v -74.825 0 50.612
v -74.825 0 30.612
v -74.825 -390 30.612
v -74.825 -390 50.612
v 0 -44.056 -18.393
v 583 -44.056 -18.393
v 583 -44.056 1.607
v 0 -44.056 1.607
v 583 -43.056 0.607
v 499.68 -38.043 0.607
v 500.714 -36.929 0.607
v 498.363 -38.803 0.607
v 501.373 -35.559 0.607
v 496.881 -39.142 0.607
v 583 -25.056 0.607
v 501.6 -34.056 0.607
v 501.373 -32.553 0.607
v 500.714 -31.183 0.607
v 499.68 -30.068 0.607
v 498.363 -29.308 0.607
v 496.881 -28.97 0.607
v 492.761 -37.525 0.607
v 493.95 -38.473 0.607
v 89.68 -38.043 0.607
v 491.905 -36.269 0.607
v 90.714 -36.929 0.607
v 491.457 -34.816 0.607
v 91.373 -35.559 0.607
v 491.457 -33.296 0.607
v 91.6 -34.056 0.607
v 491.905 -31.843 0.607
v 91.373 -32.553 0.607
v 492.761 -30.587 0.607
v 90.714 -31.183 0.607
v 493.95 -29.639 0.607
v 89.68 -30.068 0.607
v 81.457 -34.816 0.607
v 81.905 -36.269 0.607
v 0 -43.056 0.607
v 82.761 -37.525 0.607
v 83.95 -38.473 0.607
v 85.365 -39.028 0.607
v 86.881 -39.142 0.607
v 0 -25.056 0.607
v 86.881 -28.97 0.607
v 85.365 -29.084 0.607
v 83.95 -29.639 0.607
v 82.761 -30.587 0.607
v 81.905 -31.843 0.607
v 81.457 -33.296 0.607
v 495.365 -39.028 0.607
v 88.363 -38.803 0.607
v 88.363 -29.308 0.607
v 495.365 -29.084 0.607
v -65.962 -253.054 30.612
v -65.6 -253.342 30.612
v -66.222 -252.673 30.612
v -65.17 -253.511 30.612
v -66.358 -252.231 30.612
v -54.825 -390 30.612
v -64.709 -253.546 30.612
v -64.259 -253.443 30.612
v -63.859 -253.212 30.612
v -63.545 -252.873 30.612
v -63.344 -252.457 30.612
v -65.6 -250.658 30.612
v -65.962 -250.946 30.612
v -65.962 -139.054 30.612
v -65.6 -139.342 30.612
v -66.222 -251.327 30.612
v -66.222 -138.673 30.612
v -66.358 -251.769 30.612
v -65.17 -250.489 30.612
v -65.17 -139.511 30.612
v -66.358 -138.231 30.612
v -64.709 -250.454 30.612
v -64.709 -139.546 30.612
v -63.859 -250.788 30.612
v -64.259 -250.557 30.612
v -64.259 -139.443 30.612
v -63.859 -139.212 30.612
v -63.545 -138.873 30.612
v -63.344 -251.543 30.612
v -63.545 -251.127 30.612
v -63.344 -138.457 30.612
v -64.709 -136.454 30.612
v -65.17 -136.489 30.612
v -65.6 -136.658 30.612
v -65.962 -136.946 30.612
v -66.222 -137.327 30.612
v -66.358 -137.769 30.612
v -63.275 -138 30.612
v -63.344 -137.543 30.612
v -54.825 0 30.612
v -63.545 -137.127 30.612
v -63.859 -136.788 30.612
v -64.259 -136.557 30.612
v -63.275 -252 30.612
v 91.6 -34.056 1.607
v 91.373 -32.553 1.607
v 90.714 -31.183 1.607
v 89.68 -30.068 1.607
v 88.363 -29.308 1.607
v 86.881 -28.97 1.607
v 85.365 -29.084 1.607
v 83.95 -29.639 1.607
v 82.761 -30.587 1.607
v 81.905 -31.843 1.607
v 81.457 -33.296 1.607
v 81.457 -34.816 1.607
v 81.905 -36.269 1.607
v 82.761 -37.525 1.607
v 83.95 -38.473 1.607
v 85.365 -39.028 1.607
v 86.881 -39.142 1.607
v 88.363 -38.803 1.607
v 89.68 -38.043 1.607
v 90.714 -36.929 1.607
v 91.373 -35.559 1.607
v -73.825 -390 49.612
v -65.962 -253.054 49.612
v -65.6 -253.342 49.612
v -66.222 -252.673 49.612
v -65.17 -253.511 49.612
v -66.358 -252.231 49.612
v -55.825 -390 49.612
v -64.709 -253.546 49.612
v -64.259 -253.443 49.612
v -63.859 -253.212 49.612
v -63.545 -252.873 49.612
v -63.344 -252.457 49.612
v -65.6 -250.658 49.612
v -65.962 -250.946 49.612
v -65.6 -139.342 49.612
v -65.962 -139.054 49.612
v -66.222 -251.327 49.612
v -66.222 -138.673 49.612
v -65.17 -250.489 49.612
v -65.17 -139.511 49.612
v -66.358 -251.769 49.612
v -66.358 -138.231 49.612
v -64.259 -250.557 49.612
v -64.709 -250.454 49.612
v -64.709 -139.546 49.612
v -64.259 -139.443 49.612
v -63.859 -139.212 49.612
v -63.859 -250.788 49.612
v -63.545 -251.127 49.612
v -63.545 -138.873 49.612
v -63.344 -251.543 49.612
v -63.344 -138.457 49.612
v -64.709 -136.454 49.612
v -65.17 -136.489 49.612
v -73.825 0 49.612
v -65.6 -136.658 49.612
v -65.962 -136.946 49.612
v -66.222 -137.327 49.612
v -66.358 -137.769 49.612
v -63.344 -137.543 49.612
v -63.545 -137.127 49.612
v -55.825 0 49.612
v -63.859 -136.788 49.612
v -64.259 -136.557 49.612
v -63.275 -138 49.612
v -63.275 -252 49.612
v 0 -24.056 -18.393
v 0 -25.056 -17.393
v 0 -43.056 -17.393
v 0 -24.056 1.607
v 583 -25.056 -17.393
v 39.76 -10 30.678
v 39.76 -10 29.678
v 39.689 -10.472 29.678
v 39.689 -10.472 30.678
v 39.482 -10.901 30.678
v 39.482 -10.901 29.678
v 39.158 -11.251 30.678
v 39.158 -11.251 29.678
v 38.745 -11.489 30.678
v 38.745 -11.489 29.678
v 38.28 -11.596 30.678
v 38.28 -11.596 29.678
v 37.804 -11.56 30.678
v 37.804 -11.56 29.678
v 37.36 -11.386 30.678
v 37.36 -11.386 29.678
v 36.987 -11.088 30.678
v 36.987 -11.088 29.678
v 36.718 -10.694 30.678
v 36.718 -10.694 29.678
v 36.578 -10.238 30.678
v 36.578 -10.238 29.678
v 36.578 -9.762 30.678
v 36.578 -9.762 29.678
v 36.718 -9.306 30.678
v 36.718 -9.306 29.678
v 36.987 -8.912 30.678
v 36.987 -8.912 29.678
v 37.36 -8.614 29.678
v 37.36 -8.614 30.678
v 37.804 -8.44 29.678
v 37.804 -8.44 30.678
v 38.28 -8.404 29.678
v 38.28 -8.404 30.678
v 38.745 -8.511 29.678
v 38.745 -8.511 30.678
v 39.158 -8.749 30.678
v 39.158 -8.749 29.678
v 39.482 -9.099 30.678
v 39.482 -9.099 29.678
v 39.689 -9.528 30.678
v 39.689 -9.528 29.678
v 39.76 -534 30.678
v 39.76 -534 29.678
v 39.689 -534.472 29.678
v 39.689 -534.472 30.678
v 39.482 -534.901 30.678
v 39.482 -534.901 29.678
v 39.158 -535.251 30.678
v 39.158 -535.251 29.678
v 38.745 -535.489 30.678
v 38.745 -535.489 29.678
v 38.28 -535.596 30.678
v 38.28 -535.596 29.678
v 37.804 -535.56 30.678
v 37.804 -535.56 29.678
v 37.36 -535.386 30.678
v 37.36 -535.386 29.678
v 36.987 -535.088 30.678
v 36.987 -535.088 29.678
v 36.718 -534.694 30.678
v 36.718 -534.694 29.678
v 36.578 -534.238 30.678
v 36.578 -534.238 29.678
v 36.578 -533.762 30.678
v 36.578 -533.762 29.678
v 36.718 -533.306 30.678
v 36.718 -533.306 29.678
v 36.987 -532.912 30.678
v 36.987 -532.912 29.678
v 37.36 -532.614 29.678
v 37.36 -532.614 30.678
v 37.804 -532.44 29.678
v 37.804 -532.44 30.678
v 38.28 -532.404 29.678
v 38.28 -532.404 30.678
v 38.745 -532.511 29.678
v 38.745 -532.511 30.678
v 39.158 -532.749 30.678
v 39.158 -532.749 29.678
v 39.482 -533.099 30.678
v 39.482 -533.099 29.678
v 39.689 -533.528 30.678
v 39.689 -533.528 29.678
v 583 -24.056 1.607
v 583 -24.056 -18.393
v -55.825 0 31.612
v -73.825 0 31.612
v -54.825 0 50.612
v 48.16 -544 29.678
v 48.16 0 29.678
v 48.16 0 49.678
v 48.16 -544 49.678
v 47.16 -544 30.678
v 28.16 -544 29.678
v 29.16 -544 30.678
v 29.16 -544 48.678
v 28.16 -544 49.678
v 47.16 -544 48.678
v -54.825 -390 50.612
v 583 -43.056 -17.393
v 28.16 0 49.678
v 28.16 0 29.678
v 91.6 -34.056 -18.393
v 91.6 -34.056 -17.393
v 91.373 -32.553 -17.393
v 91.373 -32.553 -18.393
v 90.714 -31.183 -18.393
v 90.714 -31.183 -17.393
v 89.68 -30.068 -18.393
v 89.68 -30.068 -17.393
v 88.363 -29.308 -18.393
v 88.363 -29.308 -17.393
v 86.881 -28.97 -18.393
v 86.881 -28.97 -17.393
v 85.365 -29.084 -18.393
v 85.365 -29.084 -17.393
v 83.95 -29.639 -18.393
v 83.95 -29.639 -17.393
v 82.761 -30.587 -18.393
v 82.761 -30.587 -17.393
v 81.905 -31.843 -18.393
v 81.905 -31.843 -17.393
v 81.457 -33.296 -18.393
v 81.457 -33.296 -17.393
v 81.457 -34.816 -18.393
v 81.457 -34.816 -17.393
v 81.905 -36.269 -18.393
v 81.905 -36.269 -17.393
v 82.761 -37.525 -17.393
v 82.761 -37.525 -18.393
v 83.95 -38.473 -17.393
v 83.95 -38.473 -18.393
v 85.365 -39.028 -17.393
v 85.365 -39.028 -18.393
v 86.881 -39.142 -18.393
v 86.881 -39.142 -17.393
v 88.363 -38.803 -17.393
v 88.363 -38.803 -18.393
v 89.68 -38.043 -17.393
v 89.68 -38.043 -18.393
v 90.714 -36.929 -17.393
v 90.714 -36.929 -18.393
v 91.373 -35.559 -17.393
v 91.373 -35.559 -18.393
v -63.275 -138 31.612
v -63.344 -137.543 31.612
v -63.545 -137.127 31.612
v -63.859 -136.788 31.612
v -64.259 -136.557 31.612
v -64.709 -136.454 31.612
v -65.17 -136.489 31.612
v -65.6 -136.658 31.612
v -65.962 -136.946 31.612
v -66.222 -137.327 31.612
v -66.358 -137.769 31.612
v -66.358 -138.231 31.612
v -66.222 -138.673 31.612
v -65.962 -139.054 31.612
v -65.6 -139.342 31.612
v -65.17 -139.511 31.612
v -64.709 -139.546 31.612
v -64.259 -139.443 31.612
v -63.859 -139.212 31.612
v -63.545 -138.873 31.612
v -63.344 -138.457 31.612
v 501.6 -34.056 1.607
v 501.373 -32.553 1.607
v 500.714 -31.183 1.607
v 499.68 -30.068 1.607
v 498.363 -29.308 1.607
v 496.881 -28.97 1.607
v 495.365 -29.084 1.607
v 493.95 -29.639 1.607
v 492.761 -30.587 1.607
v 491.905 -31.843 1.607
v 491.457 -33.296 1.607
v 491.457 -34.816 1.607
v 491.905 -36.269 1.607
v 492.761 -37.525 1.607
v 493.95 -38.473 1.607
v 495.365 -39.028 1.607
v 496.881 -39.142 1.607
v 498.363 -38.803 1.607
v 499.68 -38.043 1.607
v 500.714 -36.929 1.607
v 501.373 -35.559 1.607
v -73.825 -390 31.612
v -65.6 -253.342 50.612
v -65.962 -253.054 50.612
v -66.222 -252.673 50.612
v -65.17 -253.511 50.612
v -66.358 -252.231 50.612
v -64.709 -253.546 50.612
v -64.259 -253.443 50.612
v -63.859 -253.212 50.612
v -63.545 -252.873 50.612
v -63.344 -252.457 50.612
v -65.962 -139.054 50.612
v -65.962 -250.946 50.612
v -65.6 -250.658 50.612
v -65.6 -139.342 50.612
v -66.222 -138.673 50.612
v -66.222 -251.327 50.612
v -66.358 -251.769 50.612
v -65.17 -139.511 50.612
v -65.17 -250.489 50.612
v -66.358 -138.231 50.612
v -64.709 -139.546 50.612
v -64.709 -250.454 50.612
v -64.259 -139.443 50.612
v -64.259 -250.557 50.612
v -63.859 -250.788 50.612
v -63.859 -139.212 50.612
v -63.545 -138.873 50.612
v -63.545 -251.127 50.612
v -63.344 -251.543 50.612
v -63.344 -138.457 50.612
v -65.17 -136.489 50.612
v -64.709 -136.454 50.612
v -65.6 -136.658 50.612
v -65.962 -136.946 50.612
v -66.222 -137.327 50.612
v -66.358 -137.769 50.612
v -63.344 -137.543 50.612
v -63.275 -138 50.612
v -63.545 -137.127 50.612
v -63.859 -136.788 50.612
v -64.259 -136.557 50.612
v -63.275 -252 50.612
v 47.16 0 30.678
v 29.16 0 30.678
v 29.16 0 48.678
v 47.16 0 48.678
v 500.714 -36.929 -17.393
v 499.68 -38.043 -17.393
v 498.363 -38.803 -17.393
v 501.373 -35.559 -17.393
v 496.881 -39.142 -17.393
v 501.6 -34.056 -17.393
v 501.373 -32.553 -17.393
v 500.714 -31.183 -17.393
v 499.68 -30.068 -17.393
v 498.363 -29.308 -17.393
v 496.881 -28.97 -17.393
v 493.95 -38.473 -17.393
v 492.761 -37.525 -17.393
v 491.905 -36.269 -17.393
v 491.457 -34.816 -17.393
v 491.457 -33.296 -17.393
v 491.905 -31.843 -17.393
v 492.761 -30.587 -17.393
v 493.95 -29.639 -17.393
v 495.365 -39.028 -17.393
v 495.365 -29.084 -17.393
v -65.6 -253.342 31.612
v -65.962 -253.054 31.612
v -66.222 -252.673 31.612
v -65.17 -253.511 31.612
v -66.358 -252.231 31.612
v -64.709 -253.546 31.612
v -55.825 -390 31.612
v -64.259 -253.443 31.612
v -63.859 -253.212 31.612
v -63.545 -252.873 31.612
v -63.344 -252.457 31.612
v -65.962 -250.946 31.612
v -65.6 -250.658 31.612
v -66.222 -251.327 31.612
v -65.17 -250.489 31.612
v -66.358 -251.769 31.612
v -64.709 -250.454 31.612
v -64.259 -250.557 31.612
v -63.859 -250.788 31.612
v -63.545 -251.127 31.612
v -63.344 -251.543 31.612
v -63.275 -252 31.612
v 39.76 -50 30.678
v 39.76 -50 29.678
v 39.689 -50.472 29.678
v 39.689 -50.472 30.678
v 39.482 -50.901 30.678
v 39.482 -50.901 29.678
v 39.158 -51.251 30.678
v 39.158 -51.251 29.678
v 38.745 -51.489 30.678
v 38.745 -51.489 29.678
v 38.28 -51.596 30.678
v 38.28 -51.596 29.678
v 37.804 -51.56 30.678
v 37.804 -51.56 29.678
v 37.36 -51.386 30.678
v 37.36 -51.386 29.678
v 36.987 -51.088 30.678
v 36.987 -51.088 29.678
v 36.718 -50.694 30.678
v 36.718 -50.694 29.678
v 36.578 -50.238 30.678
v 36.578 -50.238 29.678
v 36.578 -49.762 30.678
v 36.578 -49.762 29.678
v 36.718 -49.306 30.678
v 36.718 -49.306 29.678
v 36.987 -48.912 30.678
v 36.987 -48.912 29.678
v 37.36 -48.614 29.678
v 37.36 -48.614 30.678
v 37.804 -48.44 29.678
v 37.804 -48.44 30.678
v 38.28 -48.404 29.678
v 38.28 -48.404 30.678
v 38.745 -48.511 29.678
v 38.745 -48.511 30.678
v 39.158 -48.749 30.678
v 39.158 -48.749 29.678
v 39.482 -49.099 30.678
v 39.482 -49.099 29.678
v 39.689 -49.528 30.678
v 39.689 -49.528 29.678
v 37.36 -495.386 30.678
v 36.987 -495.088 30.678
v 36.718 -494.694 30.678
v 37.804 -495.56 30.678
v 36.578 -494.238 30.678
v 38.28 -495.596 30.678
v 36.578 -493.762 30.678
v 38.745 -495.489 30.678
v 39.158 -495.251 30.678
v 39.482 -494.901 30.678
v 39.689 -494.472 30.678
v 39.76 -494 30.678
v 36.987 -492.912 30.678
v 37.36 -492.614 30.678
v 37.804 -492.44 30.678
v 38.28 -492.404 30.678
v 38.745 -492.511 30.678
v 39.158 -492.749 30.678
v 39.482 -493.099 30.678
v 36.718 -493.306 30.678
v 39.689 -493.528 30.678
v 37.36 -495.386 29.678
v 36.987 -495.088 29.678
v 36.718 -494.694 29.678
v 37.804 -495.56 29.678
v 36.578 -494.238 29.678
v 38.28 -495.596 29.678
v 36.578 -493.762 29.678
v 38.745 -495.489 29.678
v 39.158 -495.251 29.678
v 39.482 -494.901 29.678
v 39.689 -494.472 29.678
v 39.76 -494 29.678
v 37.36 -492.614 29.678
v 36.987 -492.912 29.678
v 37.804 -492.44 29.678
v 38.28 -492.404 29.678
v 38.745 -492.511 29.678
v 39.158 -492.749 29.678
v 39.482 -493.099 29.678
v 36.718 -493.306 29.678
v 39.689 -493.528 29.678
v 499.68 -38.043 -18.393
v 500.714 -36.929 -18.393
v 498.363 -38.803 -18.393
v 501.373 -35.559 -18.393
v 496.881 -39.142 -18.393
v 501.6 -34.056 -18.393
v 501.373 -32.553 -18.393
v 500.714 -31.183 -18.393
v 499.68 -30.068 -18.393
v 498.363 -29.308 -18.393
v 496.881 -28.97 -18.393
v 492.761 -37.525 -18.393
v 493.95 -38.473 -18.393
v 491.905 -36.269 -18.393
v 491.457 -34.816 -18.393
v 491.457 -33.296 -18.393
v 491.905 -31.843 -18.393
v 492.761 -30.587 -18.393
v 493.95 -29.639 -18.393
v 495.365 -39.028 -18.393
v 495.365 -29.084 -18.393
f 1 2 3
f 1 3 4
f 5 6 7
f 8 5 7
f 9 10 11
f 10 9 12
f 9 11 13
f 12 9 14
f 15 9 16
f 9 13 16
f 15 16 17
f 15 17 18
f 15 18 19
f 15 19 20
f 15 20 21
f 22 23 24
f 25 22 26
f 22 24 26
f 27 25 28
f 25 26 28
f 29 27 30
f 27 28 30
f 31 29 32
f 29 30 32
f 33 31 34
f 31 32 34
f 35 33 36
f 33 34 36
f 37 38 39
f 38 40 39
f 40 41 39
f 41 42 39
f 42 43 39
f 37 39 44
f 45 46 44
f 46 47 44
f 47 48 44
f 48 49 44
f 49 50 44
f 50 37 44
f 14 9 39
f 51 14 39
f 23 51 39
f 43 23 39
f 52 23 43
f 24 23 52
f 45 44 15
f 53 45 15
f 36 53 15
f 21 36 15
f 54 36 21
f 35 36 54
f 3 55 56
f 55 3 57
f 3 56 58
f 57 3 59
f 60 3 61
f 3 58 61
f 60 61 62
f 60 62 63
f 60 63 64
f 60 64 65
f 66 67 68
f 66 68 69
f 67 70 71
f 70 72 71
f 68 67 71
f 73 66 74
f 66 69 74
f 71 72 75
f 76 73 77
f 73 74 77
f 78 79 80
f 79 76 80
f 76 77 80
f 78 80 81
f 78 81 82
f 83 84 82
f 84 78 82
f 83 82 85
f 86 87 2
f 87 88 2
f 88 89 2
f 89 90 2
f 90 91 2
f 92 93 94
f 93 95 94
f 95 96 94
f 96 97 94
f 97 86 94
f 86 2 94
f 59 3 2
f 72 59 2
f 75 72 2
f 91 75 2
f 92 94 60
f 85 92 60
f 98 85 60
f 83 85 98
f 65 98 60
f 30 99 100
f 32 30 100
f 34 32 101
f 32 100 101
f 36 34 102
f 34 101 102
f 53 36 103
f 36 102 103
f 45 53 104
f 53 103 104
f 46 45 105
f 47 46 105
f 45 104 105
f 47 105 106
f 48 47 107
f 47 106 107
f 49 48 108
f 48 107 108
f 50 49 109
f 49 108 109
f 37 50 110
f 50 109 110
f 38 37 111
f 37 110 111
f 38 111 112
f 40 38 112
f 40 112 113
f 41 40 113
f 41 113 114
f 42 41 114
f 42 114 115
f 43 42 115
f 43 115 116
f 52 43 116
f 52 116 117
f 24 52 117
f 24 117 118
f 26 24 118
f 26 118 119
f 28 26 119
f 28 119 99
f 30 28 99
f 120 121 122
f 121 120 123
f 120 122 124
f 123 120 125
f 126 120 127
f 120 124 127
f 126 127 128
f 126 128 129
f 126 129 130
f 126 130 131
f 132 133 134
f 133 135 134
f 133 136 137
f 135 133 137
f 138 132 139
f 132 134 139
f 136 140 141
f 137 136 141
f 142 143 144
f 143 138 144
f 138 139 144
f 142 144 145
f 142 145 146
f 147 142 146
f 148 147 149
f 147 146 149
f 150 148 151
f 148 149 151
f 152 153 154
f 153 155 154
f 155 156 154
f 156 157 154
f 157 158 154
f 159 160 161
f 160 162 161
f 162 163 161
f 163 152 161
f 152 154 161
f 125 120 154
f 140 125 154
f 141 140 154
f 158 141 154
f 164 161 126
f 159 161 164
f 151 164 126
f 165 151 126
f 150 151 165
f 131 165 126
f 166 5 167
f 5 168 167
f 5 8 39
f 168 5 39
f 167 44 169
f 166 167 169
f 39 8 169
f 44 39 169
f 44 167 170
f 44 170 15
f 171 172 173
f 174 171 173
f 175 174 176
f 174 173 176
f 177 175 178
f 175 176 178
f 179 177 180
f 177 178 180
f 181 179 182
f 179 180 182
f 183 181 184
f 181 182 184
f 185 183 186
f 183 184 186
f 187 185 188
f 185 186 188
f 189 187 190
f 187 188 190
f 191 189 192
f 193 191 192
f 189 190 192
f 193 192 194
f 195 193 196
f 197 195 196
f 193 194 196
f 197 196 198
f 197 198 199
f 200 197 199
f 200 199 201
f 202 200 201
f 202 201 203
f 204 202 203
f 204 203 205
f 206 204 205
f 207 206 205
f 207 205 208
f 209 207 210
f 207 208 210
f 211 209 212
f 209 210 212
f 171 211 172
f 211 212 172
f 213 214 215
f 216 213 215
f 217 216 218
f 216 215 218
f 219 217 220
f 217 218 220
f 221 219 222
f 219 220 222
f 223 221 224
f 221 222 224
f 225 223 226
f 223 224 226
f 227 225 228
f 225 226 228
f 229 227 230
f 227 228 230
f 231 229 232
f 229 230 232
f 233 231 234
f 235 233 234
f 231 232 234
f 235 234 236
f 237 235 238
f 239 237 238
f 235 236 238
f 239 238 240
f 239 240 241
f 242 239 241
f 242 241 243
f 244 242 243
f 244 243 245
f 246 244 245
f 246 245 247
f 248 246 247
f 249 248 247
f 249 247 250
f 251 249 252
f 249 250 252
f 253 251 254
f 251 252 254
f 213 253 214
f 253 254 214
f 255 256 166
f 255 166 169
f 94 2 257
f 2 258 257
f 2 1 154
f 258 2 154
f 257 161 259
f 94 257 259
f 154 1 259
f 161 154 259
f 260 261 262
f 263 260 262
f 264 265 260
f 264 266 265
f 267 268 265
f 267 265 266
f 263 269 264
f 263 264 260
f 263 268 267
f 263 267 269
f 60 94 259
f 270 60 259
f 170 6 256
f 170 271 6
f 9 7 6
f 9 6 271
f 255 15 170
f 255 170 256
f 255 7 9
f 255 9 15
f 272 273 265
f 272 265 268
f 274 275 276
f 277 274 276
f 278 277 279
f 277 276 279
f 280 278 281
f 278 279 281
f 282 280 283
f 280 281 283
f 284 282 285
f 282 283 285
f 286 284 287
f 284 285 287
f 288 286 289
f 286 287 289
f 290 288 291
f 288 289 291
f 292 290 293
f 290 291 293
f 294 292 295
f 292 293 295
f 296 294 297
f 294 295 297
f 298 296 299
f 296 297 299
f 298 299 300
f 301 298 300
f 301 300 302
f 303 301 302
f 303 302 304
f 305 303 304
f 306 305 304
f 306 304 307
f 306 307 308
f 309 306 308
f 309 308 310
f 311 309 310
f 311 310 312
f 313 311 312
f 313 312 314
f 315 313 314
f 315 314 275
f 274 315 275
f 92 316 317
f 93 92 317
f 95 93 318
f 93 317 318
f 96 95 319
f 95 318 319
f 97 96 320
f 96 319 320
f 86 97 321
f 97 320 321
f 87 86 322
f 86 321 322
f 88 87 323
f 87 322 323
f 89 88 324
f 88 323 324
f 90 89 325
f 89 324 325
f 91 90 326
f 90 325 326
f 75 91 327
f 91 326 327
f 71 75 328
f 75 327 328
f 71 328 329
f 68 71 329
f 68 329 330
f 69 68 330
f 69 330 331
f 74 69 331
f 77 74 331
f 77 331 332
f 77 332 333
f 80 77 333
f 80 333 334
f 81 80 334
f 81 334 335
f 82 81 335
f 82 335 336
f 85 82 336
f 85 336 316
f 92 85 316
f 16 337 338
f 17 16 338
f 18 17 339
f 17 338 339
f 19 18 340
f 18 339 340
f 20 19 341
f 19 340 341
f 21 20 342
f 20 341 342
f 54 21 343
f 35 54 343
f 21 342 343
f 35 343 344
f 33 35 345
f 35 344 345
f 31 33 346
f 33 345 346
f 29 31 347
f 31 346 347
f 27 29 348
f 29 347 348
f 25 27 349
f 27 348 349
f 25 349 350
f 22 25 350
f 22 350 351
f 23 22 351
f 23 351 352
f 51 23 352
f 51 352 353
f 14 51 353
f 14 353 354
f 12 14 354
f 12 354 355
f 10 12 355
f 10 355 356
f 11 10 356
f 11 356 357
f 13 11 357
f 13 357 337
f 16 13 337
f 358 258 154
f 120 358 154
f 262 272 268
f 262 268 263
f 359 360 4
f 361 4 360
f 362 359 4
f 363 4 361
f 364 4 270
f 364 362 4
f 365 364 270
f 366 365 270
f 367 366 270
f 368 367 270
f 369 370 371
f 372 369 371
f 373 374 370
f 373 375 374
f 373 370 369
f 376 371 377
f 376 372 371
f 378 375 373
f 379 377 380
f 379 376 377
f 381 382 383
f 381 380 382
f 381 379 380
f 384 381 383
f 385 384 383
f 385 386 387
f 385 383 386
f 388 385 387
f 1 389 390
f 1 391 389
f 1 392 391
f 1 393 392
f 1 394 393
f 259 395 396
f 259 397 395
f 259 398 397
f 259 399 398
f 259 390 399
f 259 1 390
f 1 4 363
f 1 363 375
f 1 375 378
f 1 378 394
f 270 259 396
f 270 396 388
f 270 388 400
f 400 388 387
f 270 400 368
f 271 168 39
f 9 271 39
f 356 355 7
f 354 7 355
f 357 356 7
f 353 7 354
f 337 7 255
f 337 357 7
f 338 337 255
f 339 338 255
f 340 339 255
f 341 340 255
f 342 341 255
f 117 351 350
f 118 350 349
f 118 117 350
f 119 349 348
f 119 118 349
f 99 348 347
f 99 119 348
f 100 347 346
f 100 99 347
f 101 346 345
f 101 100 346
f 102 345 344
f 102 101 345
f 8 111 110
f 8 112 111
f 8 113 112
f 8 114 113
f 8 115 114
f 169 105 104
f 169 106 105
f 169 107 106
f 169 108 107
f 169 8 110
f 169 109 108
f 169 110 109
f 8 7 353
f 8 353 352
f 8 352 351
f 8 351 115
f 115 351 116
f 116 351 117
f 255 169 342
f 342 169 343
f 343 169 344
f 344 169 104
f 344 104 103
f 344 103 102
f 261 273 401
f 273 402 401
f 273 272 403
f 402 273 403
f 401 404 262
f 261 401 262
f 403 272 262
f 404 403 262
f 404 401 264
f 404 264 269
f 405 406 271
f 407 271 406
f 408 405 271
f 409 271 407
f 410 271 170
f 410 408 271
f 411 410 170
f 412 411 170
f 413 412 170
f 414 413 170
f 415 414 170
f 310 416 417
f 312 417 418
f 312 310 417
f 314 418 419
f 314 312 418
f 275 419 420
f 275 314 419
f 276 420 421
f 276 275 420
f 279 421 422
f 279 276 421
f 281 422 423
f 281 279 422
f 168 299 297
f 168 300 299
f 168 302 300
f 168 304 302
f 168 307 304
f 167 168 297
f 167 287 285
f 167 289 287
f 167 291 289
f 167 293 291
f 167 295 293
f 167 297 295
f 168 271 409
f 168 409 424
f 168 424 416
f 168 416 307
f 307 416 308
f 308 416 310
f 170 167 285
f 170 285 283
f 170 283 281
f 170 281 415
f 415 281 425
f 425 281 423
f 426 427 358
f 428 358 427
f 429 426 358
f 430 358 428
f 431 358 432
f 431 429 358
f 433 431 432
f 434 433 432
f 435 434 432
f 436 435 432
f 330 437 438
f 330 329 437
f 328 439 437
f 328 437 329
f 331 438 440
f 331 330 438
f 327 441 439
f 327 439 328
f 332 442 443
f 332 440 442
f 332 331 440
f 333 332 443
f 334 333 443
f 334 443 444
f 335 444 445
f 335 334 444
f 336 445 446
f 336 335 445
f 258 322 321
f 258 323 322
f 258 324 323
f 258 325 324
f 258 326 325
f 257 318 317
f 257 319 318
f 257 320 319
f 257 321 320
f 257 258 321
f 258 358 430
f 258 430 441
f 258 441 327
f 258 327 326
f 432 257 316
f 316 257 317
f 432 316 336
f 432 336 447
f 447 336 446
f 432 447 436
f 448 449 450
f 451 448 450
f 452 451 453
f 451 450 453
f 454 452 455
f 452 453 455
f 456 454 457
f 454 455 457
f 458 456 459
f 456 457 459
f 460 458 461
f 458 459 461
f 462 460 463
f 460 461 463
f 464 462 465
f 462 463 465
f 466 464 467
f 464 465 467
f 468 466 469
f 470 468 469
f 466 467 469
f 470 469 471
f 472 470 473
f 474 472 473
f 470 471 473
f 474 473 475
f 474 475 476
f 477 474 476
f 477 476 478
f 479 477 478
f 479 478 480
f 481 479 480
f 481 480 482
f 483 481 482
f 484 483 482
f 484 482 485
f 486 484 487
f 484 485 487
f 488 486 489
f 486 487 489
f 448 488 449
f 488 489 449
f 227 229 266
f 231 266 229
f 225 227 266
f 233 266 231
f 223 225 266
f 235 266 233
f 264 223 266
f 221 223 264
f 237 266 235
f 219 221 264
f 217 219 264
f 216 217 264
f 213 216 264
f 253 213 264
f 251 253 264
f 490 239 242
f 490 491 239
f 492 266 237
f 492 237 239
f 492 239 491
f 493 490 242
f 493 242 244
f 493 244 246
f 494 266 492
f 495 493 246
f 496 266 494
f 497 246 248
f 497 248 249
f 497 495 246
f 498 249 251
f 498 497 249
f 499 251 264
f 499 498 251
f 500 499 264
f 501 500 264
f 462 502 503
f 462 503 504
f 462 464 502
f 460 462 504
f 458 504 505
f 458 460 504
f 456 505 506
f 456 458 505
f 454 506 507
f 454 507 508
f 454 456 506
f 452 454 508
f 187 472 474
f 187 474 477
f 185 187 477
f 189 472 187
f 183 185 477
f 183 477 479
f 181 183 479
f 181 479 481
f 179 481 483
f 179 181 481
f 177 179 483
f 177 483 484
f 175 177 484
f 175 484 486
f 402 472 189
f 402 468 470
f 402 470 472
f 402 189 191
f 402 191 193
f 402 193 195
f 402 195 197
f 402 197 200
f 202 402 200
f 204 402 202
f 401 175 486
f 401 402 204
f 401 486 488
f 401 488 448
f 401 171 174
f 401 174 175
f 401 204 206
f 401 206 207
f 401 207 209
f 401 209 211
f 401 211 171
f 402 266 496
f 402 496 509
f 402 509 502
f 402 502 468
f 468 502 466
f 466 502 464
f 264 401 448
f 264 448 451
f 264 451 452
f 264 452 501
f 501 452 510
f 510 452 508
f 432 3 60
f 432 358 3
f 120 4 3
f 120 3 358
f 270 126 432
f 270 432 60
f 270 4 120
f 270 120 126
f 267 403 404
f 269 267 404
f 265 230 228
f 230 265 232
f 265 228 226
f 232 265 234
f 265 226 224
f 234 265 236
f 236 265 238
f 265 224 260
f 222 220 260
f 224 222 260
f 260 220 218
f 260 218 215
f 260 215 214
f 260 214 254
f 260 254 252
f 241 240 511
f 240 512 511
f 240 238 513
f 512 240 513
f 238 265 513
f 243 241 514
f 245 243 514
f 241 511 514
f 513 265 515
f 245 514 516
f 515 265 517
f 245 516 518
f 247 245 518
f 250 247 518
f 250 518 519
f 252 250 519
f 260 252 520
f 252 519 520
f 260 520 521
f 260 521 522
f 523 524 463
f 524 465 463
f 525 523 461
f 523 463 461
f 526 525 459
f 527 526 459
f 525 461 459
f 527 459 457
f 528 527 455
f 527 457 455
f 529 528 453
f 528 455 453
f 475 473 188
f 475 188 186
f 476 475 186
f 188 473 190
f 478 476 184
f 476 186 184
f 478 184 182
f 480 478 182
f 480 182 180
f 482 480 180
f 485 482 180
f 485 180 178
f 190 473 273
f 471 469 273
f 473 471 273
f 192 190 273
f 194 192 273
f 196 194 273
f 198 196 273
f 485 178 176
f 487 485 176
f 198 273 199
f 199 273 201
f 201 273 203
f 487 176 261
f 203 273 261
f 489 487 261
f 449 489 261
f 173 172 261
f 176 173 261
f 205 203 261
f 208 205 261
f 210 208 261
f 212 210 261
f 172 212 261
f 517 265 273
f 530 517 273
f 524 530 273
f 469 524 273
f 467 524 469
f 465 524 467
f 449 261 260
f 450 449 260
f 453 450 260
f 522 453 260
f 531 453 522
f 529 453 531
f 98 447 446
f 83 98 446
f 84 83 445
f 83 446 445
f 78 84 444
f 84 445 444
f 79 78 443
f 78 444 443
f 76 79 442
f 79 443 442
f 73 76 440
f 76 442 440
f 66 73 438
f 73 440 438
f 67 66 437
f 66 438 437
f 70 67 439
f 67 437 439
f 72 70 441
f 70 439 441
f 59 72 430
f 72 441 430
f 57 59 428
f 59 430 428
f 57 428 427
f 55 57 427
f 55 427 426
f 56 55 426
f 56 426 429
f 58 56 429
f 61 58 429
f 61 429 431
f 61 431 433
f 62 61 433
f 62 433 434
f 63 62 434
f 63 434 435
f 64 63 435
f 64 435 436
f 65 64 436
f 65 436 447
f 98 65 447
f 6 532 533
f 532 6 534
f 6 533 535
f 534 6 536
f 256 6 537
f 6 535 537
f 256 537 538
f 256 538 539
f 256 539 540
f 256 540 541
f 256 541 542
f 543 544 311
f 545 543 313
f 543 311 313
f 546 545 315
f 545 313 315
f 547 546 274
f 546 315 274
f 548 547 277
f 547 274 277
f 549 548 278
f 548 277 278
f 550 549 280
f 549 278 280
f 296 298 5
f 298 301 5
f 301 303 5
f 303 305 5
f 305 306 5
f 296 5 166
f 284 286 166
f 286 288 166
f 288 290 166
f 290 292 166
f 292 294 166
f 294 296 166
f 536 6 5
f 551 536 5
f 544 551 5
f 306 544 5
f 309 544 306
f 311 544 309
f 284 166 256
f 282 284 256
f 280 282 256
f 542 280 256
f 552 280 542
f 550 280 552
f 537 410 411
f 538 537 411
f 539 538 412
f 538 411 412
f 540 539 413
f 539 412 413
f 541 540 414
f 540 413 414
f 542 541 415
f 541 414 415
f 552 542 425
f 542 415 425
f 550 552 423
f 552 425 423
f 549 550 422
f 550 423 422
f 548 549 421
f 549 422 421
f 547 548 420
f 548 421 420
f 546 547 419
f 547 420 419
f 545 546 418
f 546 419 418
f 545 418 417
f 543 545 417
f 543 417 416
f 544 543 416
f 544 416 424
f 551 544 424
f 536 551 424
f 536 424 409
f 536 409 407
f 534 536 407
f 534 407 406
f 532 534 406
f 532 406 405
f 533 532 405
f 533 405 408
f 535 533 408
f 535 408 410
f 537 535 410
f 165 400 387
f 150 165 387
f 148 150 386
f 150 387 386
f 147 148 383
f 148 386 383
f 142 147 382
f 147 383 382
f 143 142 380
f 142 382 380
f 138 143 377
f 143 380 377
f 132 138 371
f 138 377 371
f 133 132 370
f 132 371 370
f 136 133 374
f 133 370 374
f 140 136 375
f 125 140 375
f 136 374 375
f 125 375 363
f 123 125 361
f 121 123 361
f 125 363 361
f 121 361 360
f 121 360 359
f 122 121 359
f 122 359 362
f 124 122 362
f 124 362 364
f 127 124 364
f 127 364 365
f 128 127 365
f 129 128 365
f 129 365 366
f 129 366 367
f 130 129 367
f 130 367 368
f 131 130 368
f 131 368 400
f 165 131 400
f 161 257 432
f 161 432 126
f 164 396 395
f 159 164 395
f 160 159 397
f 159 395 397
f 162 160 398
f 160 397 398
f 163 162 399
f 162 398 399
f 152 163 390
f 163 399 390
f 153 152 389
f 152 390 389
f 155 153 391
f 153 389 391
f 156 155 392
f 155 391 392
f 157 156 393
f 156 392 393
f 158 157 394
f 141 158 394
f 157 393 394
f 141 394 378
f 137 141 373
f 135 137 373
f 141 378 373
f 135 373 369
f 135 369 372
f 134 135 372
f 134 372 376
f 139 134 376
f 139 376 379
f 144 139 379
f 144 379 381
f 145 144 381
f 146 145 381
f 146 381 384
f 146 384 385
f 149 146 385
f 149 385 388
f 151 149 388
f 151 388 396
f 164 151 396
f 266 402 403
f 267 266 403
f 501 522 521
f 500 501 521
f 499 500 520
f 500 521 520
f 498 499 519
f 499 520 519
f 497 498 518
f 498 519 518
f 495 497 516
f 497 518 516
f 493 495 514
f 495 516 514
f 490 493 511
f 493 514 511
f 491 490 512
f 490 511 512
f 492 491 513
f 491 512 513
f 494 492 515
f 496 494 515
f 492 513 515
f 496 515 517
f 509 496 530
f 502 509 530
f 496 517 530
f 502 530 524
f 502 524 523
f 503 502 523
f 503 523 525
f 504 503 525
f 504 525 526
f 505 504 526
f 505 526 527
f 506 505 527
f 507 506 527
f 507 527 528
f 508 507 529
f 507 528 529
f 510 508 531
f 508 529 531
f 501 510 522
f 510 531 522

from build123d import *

# Parameters (mm, degrees)
F0_W      = 20
F0_H      = 20
F0_W_2    = 18
F0_H_2    = 18
F1_DEPTH  = 390
F2_R      = 1.55
F3_DEPTH  = 20
F4_W      = 20
F4_H      = 20
F4_W_2    = 18
F4_H_2    = 18
F5_DEPTH  = 583
F6_R      = 5.1
F7_DEPTH  = 20.001
F8_W      = 20
F8_H      = 20
F8_W_2    = 18
F8_H_2    = 18
F9_DEPTH  = 544
F10_R     = 1.6
F11_DEPTH = 1


# Not quite as in the source:
# - a feature names something its author has since deleted; it is built from what else it names


with BuildPart() as f1:
    # F0 (on Front) → F1 (new body)
    with BuildSketch(Plane.XZ):
        with Locations((-64.8252740502, 40.6123196004)):
            Rectangle(F0_W, F0_H)
        with Locations((-64.8252740502, 40.6123196004)):
            Rectangle(F0_W_2, F0_H_2, mode=Mode.SUBTRACT)
    extrude(amount=F1_DEPTH)

    # F2 (on face) → F3 (cut, through all)
    with BuildSketch(Plane.XY.offset(50.6123196004)):
        with Locations((-64.8252740502, -138)):
            Circle(F2_R)
        with Locations((-64.8252740502, -252)):
            Circle(F2_R)
    extrude(amount=-F3_DEPTH, mode=Mode.SUBTRACT)


with BuildPart() as f5:
    # F4 (on Right) → F5 (new body)
    with BuildSketch(Plane.YZ):
        with Locations((-34.0558066964, -8.3925398067)):
            Rectangle(F4_W, F4_H)
        with Locations((-34.0558066964, -8.3925398067)):
            Rectangle(F4_W_2, F4_H_2, mode=Mode.SUBTRACT)
    extrude(amount=F5_DEPTH)

    # F6 (on face) → F7 (cut, through all)
    with BuildSketch(Plane.XY.offset(1.6074601933)):
        with Locations((86.5, -34.0558066964)):
            Circle(F6_R)
        with Locations((496.5, -34.0558066964)):
            Circle(F6_R)
    extrude(amount=-F7_DEPTH, mode=Mode.SUBTRACT)


with BuildPart() as f9:
    # F8 (on Front) → F9 (new body)
    with BuildSketch(Plane.XZ):
        with Locations((38.1599590182, 39.6779589355)):
            Rectangle(F8_W, F8_H)
        with Locations((38.1599590182, 39.6779589355)):
            Rectangle(F8_W_2, F8_H_2, mode=Mode.SUBTRACT)
    extrude(amount=F9_DEPTH)

    # F10 (on face) → F11 (cut, through all)
    with BuildSketch(Plane(origin=(0, 0, 29.6779589355), x_dir=(1, 0, 0), z_dir=(0, 0, -1))):
        with Locations((38.1599590182, 10)):
            Circle(F10_R)
        with Locations((38.1599590182, 50)):
            Circle(F10_R)
        with Locations((38.1599590182, 494)):
            Circle(F10_R)
        with Locations((38.1599590182, 534)):
            Circle(F10_R)
    extrude(amount=-F11_DEPTH, mode=Mode.SUBTRACT)


solid = Compound([f1.part, f5.part, f9.part])
